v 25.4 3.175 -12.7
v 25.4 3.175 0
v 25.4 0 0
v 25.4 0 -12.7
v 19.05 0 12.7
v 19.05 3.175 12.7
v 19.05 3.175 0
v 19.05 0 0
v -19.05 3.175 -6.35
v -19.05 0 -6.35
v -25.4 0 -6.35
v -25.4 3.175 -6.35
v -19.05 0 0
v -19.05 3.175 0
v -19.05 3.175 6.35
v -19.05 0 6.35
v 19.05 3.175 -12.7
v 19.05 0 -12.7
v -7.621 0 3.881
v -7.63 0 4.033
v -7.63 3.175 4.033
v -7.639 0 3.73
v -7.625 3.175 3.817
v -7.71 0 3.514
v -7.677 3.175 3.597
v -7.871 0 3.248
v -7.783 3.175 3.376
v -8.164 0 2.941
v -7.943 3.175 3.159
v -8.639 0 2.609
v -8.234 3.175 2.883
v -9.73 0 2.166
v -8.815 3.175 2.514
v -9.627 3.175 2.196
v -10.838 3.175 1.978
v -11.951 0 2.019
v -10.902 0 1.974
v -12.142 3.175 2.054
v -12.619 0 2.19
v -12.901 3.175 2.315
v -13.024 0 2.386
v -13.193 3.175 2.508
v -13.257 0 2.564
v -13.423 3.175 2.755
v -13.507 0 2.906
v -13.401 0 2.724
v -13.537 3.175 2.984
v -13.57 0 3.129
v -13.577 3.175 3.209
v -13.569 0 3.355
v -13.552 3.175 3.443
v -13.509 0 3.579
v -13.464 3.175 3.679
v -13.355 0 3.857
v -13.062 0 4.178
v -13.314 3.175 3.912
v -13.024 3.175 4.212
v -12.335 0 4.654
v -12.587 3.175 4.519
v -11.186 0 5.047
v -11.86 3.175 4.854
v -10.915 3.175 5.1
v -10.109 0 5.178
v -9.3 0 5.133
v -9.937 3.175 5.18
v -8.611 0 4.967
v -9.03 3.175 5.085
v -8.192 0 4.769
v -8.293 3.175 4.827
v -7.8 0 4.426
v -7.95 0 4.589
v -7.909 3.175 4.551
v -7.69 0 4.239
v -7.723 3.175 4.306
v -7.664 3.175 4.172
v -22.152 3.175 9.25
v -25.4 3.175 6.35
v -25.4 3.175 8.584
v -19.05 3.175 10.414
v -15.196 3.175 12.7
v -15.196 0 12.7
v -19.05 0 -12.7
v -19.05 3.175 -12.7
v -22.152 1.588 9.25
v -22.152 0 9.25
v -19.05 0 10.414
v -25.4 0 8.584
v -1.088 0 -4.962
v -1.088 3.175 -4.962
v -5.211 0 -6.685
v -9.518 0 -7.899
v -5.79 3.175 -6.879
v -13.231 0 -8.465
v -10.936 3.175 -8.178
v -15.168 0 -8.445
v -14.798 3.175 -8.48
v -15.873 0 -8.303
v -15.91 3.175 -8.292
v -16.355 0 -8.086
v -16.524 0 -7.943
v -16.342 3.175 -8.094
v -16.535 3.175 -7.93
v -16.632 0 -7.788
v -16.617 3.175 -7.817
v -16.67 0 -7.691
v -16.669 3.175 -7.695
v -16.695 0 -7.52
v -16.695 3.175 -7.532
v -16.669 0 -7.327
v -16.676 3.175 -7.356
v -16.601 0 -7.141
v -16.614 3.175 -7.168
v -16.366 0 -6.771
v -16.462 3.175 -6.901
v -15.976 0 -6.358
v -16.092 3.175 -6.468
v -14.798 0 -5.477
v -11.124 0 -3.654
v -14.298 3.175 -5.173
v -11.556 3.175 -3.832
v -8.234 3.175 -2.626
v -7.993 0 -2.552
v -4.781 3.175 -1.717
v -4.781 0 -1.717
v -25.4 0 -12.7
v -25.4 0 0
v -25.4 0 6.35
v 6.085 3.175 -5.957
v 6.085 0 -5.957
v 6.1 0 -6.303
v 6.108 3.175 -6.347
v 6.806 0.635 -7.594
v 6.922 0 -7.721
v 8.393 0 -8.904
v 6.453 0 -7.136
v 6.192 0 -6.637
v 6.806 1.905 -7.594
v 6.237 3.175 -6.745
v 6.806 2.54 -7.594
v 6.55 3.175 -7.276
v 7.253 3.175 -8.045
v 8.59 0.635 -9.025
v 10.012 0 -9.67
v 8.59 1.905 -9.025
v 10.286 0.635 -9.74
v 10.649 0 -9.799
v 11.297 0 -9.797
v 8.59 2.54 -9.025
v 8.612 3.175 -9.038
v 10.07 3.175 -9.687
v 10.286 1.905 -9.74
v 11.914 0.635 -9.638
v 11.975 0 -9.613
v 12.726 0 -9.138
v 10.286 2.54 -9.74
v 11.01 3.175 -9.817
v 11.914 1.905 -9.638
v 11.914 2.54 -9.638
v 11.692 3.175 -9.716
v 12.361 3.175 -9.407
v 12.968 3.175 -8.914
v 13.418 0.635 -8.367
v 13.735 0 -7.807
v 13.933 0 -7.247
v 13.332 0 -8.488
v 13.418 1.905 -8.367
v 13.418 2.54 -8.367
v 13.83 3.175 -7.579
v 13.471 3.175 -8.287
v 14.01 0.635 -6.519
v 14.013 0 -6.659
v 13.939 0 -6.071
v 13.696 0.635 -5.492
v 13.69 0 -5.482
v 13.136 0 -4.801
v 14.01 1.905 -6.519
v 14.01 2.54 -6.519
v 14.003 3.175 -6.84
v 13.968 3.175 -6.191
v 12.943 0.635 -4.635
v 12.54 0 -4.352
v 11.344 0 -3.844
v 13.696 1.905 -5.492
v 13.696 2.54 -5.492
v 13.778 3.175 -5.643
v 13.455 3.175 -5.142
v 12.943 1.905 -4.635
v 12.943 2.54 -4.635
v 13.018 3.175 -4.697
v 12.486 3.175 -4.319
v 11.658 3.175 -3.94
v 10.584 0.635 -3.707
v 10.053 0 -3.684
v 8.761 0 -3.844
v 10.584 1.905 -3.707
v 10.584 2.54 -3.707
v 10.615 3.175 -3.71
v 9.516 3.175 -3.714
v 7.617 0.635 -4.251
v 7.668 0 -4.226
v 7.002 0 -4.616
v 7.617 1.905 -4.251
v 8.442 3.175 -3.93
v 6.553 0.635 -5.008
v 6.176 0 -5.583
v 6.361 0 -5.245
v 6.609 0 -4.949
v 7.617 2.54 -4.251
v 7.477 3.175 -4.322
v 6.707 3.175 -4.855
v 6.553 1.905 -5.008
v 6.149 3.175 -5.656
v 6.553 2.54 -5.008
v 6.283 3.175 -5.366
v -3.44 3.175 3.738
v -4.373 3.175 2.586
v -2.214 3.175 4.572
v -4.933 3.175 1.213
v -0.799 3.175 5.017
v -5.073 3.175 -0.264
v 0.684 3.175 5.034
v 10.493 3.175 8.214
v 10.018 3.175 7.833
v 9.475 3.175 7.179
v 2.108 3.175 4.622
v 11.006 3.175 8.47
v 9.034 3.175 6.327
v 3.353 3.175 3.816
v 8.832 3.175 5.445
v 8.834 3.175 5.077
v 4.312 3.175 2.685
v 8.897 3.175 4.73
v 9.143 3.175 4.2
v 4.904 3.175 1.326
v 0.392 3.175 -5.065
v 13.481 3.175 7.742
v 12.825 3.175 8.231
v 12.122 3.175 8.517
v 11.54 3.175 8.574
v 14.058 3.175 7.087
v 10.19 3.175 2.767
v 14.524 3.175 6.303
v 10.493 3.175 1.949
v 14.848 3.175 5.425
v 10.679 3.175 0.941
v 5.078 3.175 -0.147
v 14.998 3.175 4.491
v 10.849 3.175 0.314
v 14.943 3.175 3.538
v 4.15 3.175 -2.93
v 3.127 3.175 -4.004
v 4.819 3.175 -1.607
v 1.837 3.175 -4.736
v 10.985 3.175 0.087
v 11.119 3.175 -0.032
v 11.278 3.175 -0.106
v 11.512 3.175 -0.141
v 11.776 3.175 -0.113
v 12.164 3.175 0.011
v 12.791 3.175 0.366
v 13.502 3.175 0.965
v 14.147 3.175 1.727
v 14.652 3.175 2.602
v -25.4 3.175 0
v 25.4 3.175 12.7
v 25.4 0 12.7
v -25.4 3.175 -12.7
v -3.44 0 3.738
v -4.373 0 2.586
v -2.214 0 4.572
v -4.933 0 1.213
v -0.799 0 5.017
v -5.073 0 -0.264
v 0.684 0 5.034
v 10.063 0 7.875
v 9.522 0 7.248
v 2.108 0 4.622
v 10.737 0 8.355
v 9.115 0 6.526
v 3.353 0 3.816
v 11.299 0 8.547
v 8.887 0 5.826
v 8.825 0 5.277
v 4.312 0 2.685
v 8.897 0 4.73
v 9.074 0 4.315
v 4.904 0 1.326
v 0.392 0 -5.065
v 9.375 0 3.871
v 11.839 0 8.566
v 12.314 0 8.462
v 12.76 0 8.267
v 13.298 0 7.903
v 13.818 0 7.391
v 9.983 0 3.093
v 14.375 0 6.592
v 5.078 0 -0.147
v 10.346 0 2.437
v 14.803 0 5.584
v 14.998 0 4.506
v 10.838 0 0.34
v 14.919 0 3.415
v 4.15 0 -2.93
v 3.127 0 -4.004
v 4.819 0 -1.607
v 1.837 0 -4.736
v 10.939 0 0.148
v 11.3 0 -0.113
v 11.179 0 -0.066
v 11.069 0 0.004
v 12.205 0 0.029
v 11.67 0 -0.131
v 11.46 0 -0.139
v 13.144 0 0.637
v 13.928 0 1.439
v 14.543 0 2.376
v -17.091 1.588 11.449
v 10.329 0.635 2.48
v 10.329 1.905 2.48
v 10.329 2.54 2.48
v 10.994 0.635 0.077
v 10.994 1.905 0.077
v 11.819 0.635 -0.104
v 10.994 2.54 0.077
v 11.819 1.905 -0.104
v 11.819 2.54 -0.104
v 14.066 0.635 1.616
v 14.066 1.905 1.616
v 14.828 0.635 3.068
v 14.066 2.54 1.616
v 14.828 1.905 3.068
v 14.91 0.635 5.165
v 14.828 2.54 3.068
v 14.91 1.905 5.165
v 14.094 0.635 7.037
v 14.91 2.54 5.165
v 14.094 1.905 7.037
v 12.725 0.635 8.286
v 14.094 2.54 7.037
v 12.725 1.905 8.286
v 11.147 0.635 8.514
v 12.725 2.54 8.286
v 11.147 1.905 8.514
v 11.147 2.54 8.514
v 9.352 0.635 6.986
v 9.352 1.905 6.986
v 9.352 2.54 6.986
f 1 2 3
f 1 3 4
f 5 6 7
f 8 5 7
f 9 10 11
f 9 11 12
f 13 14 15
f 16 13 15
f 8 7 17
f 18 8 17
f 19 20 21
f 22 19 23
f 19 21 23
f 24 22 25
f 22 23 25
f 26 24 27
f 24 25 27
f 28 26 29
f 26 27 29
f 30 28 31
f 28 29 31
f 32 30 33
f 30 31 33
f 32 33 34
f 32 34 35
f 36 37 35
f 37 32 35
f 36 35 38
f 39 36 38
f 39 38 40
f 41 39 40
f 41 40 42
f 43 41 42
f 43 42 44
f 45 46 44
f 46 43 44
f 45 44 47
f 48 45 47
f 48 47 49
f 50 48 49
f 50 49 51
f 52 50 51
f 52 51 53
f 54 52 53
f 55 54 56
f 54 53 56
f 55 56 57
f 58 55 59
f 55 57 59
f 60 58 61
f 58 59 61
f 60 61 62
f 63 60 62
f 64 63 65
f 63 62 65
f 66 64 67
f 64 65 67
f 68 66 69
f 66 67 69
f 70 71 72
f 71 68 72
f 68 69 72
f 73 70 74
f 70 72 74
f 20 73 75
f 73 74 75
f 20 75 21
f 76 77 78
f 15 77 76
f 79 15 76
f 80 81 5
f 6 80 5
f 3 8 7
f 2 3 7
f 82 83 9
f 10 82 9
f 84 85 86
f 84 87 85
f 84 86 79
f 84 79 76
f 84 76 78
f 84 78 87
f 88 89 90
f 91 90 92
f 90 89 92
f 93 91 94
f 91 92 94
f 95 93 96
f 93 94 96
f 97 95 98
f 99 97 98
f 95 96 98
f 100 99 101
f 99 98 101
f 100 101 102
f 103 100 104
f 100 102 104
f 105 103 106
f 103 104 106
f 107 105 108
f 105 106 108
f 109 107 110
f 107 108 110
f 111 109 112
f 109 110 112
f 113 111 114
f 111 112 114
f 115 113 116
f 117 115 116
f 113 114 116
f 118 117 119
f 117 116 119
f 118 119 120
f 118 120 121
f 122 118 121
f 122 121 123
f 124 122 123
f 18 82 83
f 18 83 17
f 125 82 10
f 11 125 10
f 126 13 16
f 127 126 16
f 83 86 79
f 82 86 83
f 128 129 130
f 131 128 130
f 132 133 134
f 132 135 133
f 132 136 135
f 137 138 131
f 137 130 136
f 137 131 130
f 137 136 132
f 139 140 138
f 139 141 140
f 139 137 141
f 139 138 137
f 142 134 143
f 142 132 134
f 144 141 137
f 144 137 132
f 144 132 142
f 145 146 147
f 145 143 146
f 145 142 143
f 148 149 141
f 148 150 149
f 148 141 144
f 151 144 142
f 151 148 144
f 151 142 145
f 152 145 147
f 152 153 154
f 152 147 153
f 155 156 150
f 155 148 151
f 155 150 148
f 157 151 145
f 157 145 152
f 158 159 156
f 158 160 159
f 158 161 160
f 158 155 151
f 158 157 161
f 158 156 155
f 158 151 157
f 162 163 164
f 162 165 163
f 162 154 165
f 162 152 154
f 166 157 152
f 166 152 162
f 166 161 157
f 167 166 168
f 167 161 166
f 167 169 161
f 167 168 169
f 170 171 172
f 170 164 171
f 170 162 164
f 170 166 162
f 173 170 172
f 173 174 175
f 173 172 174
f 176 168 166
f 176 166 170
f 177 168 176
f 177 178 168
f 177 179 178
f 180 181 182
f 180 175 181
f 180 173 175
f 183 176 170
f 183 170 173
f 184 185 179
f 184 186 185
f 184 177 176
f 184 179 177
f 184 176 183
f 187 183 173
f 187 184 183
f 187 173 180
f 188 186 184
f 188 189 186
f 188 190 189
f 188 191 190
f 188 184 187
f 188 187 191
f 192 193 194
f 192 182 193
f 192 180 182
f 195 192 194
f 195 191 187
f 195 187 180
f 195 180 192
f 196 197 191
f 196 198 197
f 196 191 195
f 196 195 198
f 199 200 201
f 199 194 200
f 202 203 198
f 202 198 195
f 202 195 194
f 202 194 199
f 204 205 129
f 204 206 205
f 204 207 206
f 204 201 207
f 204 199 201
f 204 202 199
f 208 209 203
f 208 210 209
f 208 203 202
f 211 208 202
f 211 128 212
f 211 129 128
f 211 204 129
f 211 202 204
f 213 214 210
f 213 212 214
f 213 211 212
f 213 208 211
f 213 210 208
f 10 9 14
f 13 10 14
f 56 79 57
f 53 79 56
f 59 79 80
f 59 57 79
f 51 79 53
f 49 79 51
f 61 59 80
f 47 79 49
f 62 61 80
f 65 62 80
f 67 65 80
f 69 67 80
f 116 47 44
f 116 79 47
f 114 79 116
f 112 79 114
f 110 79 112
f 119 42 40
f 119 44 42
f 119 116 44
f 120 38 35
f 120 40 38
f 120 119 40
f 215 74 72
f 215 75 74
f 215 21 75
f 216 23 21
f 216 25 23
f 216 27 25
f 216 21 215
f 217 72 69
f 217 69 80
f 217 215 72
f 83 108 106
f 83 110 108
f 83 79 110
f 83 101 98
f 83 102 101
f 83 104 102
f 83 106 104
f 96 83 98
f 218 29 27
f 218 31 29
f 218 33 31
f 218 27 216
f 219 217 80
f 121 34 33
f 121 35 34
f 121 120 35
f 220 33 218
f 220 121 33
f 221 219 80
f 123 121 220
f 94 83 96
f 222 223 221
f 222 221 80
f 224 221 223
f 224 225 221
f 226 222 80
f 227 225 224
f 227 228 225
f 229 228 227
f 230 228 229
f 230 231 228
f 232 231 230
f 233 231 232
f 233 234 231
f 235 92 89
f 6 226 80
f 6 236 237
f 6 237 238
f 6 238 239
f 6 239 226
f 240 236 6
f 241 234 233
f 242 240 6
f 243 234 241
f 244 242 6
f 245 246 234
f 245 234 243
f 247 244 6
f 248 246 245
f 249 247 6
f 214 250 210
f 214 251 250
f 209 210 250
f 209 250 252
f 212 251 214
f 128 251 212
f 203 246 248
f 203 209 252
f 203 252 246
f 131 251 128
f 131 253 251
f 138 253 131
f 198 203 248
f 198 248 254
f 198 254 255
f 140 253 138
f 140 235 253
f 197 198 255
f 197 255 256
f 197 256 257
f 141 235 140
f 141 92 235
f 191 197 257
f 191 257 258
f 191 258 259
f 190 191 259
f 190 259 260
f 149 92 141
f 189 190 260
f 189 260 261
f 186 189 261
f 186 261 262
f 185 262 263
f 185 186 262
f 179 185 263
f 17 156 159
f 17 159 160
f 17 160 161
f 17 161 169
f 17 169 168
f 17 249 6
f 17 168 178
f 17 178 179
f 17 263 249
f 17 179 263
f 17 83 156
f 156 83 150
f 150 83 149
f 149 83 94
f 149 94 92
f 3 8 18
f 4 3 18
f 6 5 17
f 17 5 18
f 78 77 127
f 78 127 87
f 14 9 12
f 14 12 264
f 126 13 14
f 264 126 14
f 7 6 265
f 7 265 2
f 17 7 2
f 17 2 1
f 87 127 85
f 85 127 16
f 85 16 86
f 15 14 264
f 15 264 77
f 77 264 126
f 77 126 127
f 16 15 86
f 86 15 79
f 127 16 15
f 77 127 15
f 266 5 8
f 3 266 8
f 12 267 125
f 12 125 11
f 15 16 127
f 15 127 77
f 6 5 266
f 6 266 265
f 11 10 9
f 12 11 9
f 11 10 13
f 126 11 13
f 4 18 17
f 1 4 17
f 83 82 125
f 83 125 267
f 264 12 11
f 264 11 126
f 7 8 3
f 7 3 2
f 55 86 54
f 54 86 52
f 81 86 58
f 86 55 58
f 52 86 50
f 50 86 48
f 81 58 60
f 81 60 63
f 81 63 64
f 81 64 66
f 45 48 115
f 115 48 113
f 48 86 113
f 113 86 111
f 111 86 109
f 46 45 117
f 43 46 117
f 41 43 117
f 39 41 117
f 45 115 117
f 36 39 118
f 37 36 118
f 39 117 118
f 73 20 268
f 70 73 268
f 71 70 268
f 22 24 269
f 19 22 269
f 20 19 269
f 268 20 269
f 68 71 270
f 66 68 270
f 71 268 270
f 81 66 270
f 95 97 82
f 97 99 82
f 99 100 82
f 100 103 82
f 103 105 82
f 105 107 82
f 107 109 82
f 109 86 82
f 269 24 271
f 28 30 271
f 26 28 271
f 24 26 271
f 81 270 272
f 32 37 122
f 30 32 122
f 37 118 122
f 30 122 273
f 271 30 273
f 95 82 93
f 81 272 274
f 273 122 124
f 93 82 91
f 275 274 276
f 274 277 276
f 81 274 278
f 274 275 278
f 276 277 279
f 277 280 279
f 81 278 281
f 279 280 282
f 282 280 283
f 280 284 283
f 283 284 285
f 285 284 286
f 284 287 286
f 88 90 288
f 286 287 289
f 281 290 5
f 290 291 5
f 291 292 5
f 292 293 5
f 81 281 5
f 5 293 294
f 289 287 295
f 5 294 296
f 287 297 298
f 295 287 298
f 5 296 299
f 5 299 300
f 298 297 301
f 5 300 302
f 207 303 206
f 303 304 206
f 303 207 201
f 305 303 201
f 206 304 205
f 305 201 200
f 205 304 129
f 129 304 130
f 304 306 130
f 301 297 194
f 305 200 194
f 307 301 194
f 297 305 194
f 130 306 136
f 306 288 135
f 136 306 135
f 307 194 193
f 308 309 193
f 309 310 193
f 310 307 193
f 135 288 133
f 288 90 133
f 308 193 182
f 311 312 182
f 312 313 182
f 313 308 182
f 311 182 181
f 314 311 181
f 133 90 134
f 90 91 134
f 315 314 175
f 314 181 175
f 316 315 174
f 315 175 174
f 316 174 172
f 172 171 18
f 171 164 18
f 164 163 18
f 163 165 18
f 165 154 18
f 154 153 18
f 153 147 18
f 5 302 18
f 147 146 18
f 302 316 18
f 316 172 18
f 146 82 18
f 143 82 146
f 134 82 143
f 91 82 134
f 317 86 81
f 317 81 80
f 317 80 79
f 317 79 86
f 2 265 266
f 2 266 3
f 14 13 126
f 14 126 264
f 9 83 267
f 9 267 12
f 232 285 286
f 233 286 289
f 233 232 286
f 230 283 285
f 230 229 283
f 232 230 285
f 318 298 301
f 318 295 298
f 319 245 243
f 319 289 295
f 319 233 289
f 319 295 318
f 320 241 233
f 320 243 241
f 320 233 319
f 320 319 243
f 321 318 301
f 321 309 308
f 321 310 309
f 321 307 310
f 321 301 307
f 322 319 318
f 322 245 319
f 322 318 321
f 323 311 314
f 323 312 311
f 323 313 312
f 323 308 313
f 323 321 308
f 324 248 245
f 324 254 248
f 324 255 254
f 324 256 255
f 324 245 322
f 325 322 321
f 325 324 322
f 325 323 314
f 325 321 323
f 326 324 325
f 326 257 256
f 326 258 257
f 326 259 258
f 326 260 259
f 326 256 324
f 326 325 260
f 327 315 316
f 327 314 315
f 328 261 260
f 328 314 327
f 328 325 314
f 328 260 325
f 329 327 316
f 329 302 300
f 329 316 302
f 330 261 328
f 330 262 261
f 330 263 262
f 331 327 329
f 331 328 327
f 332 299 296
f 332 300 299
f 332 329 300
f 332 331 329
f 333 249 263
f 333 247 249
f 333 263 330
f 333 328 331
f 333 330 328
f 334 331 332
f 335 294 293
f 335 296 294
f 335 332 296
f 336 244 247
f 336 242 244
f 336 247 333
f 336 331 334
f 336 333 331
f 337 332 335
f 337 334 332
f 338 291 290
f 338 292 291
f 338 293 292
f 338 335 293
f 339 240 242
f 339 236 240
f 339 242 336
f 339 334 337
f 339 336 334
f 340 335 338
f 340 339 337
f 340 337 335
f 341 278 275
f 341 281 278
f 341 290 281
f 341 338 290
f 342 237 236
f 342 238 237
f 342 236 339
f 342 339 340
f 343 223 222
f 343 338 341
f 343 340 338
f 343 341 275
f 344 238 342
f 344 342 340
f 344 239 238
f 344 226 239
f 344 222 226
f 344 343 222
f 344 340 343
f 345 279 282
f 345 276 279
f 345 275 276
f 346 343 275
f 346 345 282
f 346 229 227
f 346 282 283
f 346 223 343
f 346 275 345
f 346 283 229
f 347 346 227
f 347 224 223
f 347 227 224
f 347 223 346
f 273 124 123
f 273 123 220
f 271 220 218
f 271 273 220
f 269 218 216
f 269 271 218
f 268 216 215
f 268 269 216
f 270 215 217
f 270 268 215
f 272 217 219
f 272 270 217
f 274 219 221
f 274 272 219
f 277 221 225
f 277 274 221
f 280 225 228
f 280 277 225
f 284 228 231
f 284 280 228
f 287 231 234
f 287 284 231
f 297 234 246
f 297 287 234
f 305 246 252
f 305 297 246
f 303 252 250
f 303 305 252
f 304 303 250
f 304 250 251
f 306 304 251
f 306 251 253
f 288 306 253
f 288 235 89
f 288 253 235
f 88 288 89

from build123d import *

# Parameters (mm, degrees)
SKETCH1_W           = 38.1
SKETCH1_H           = 25.4
SKETCH1_R           = 5.08
BOSS_EXTRUDE1_DEPTH = 3.175
SKETCH2_W           = 6.35
SKETCH2_H           = 3.175
BOSS_EXTRUDE3_DEPTH = 6.35
SKETCH2_4_W         = 6.35
SKETCH2_4_H         = 3.175
BOSS_EXTRUDE4_DEPTH = 6.35
SKETCH2_6_W         = 6.35
SKETCH2_6_H         = 3.175
BOSS_EXTRUDE6_DEPTH = 6.35
SKETCH2_7_W         = 6.35
SKETCH2_7_H         = 3.175
BOSS_EXTRUDE7_DEPTH = 6.35
SKETCH4_W           = 12.7
SKETCH4_H           = 3.175
BOSS_EXTRUDE8_DEPTH = 6.35
SKETCH4_3_W         = 12.7
SKETCH4_3_H         = 3.175
BOSS_EXTRUDE9_DEPTH = 6.35
CUT_EXTRUDE26_START = -3.175
CUT_EXTRUDE26_DEPTH = 3.175
SKETCH20_RX         = 3.004459521
SKETCH20_RY         = 1.558481615
CUT_EXTRUDE30_DEPTH = 29.575000153
CUT_EXTRUDE31_DEPTH = 29.575000153
SKETCH21_RX         = 9.834488757
SKETCH21_RY         = 2.394817115
CUT_EXTRUDE32_DEPTH = 29.575000153
CUT_EXTRUDE33_DEPTH = 29.57500022


# Read off the part's stored shape, not the designer's step: Cut-Extrude26
with BuildPart() as part:
    # Sketch1 → Boss-Extrude1 (new body)
    with BuildSketch(Plane(origin=(0, 0, 0), x_dir=(1, 0, 0), z_dir=(0, 1, 0))):
        Rectangle(SKETCH1_W, SKETCH1_H)
        with Locations(Location((0, 0, 0), (0, 0, 270))):
            Circle(SKETCH1_R, mode=Mode.SUBTRACT)
    extrude(amount=BOSS_EXTRUDE1_DEPTH)


with BuildPart() as body_2:
    # Sketch2 → Boss-Extrude3 (new body)
    with BuildSketch(Plane.ZY.offset(19.05)):
        with Locations((-9.525, 1.5875)):
            Rectangle(SKETCH2_W, SKETCH2_H)
    extrude(amount=BOSS_EXTRUDE3_DEPTH)


with BuildPart() as body_3:
    # Sketch2<4> → Boss-Extrude4 (new body)
    with BuildSketch(Plane.ZY.offset(19.05)):
        with Locations((-3.175, 1.5875)):
            Rectangle(SKETCH2_4_W, SKETCH2_4_H)
    extrude(amount=BOSS_EXTRUDE4_DEPTH)


with BuildPart() as body_4:
    # Sketch2<6> → Boss-Extrude6 (new body)
    with BuildSketch(Plane.ZY.offset(19.05)):
        with Locations((3.175, 1.5875)):
            Rectangle(SKETCH2_6_W, SKETCH2_6_H)
    extrude(amount=BOSS_EXTRUDE6_DEPTH)


with BuildPart() as body_5:
    # Sketch2<7> → Boss-Extrude7 (new body)
    with BuildSketch(Plane.ZY.offset(19.05)):
        with Locations((9.525, 1.5875)):
            Rectangle(SKETCH2_7_W, SKETCH2_7_H)
    extrude(amount=BOSS_EXTRUDE7_DEPTH)


with BuildPart() as body_6:
    # Sketch4 → Boss-Extrude8 (new body)
    with BuildSketch(Plane(origin=(19.05, 0, 0), x_dir=(0, 0, -1), z_dir=(1, 0, 0))):
        with Locations((-6.35, 1.5875)):
            Rectangle(SKETCH4_W, SKETCH4_H)
    extrude(amount=BOSS_EXTRUDE8_DEPTH)


with BuildPart() as body_7:
    # Sketch4<3> → Boss-Extrude9 (new body)
    with BuildSketch(Plane(origin=(19.05, 0, 0), x_dir=(0, 0, -1), z_dir=(1, 0, 0))):
        with Locations((6.35, 1.5875)):
            Rectangle(SKETCH4_3_W, SKETCH4_3_H)
    extrude(amount=BOSS_EXTRUDE9_DEPTH)


with BuildPart() as cut_extrude26_tool:
    # Cut-Extrude26 outline → Cut-Extrude26 (new body)
    with BuildSketch(Plane(origin=(0, 3.175, 0), x_dir=(1, 0, 0), z_dir=(0, 1, 0)).offset(CUT_EXTRUDE26_START)):
        with BuildLine():
            Line((-25.40000001, -8.584161711), (-25.4, -12.7))
            Line((-25.4, -12.7), (-15.195735819, -12.7))
            add(Edge.make_bspline(
                [(-15.195735819, -12.7), (-19.896484417, -9.275242159), (-25.40000001, -8.584161711)],
                knots=[0.629884856, 0.629884856, 0.629884856, 1.343767888, 1.343767888, 1.343767888], degree=2))
        make_face()
    extrude(amount=CUT_EXTRUDE26_DEPTH)


with BuildPart() as part_1:
    add(part.part)

    # Cut-Extrude26: cut by cut_extrude26_tool
    add(cut_extrude26_tool.part, mode=Mode.SUBTRACT)

    # Sketch20 → Cut-Extrude30 (cut, through all)
    with BuildSketch(Plane(origin=(0, 3.175, 0), x_dir=(1, 0, 0), z_dir=(0, 1, 0))):
        with Locations(Location((-10.598682853, -3.572248522), (0, 0, -8.820379552))):
            Ellipse(SKETCH20_RX, SKETCH20_RY)
    extrude(amount=-CUT_EXTRUDE30_DEPTH, mode=Mode.SUBTRACT)

    # Sketch18 → Cut-Extrude31 (cut, through all)
    with BuildSketch(Plane(origin=(0, 3.175, 0), x_dir=(1, 0, 0), z_dir=(0, 1, 0))):
        with BuildLine():
            add(Edge.make_bspline(
                [(8.89707251, -4.729765561), (9.131509688, -3.916570321), (10.738548368, -2.859569013), (10.487378328, 1.696754067), (17.502350701, -3.445877025), (11.594859569, -11.232638154), (8.510073602, -6.072153622), (8.89707251, -4.729765561)],
                knots=[0, 0, 0, 0, 0.126992451, 0.245733089, 0.477340126, 0.790366271, 1, 1, 1, 1], degree=3))
        make_face()
    extrude(amount=-CUT_EXTRUDE31_DEPTH, mode=Mode.SUBTRACT)

    # Sketch21 → Cut-Extrude32 (cut, through all)
    with BuildSketch(Plane(origin=(0, 3.175, 0), x_dir=(1, 0, 0), z_dir=(0, 1, 0))):
        with Locations(Location((-7.260829298, 4.832030762), (0, 0, 163.072486936))):
            Ellipse(SKETCH21_RX, SKETCH21_RY)
    extrude(amount=-CUT_EXTRUDE32_DEPTH, mode=Mode.SUBTRACT)

    # Sketch23 → Cut-Extrude33 (cut, through all)
    with BuildSketch(Plane(origin=(0, 3.175, 0), x_dir=(1, 0, 0), z_dir=(0, 1, 0))):
        with BuildLine():
            add(Edge.make_bspline(
                [(6.084779473, 5.956947977), (5.988800305, 7.019640943), (8.360613638, 9.276299903), (12.16405117, 10.45489234), (15.257834124, 6.071463409), (10.610458282, 2.538680826), (6.206679233, 4.607259091), (6.084779473, 5.956947977)],
                knots=[0, 0, 0, 0, 0.192637987, 0.357007452, 0.539778503, 0.755337281, 1, 1, 1, 1], degree=3))
        make_face()
    extrude(amount=-CUT_EXTRUDE33_DEPTH, mode=Mode.SUBTRACT)


with BuildPart() as body_5_1:
    add(body_5.part)

    # Cut-Extrude26: cut by cut_extrude26_tool
    add(cut_extrude26_tool.part, mode=Mode.SUBTRACT)


solid = Compound([body_2.part, body_3.part, body_4.part, body_6.part, body_7.part, part_1.part, body_5_1.part])
